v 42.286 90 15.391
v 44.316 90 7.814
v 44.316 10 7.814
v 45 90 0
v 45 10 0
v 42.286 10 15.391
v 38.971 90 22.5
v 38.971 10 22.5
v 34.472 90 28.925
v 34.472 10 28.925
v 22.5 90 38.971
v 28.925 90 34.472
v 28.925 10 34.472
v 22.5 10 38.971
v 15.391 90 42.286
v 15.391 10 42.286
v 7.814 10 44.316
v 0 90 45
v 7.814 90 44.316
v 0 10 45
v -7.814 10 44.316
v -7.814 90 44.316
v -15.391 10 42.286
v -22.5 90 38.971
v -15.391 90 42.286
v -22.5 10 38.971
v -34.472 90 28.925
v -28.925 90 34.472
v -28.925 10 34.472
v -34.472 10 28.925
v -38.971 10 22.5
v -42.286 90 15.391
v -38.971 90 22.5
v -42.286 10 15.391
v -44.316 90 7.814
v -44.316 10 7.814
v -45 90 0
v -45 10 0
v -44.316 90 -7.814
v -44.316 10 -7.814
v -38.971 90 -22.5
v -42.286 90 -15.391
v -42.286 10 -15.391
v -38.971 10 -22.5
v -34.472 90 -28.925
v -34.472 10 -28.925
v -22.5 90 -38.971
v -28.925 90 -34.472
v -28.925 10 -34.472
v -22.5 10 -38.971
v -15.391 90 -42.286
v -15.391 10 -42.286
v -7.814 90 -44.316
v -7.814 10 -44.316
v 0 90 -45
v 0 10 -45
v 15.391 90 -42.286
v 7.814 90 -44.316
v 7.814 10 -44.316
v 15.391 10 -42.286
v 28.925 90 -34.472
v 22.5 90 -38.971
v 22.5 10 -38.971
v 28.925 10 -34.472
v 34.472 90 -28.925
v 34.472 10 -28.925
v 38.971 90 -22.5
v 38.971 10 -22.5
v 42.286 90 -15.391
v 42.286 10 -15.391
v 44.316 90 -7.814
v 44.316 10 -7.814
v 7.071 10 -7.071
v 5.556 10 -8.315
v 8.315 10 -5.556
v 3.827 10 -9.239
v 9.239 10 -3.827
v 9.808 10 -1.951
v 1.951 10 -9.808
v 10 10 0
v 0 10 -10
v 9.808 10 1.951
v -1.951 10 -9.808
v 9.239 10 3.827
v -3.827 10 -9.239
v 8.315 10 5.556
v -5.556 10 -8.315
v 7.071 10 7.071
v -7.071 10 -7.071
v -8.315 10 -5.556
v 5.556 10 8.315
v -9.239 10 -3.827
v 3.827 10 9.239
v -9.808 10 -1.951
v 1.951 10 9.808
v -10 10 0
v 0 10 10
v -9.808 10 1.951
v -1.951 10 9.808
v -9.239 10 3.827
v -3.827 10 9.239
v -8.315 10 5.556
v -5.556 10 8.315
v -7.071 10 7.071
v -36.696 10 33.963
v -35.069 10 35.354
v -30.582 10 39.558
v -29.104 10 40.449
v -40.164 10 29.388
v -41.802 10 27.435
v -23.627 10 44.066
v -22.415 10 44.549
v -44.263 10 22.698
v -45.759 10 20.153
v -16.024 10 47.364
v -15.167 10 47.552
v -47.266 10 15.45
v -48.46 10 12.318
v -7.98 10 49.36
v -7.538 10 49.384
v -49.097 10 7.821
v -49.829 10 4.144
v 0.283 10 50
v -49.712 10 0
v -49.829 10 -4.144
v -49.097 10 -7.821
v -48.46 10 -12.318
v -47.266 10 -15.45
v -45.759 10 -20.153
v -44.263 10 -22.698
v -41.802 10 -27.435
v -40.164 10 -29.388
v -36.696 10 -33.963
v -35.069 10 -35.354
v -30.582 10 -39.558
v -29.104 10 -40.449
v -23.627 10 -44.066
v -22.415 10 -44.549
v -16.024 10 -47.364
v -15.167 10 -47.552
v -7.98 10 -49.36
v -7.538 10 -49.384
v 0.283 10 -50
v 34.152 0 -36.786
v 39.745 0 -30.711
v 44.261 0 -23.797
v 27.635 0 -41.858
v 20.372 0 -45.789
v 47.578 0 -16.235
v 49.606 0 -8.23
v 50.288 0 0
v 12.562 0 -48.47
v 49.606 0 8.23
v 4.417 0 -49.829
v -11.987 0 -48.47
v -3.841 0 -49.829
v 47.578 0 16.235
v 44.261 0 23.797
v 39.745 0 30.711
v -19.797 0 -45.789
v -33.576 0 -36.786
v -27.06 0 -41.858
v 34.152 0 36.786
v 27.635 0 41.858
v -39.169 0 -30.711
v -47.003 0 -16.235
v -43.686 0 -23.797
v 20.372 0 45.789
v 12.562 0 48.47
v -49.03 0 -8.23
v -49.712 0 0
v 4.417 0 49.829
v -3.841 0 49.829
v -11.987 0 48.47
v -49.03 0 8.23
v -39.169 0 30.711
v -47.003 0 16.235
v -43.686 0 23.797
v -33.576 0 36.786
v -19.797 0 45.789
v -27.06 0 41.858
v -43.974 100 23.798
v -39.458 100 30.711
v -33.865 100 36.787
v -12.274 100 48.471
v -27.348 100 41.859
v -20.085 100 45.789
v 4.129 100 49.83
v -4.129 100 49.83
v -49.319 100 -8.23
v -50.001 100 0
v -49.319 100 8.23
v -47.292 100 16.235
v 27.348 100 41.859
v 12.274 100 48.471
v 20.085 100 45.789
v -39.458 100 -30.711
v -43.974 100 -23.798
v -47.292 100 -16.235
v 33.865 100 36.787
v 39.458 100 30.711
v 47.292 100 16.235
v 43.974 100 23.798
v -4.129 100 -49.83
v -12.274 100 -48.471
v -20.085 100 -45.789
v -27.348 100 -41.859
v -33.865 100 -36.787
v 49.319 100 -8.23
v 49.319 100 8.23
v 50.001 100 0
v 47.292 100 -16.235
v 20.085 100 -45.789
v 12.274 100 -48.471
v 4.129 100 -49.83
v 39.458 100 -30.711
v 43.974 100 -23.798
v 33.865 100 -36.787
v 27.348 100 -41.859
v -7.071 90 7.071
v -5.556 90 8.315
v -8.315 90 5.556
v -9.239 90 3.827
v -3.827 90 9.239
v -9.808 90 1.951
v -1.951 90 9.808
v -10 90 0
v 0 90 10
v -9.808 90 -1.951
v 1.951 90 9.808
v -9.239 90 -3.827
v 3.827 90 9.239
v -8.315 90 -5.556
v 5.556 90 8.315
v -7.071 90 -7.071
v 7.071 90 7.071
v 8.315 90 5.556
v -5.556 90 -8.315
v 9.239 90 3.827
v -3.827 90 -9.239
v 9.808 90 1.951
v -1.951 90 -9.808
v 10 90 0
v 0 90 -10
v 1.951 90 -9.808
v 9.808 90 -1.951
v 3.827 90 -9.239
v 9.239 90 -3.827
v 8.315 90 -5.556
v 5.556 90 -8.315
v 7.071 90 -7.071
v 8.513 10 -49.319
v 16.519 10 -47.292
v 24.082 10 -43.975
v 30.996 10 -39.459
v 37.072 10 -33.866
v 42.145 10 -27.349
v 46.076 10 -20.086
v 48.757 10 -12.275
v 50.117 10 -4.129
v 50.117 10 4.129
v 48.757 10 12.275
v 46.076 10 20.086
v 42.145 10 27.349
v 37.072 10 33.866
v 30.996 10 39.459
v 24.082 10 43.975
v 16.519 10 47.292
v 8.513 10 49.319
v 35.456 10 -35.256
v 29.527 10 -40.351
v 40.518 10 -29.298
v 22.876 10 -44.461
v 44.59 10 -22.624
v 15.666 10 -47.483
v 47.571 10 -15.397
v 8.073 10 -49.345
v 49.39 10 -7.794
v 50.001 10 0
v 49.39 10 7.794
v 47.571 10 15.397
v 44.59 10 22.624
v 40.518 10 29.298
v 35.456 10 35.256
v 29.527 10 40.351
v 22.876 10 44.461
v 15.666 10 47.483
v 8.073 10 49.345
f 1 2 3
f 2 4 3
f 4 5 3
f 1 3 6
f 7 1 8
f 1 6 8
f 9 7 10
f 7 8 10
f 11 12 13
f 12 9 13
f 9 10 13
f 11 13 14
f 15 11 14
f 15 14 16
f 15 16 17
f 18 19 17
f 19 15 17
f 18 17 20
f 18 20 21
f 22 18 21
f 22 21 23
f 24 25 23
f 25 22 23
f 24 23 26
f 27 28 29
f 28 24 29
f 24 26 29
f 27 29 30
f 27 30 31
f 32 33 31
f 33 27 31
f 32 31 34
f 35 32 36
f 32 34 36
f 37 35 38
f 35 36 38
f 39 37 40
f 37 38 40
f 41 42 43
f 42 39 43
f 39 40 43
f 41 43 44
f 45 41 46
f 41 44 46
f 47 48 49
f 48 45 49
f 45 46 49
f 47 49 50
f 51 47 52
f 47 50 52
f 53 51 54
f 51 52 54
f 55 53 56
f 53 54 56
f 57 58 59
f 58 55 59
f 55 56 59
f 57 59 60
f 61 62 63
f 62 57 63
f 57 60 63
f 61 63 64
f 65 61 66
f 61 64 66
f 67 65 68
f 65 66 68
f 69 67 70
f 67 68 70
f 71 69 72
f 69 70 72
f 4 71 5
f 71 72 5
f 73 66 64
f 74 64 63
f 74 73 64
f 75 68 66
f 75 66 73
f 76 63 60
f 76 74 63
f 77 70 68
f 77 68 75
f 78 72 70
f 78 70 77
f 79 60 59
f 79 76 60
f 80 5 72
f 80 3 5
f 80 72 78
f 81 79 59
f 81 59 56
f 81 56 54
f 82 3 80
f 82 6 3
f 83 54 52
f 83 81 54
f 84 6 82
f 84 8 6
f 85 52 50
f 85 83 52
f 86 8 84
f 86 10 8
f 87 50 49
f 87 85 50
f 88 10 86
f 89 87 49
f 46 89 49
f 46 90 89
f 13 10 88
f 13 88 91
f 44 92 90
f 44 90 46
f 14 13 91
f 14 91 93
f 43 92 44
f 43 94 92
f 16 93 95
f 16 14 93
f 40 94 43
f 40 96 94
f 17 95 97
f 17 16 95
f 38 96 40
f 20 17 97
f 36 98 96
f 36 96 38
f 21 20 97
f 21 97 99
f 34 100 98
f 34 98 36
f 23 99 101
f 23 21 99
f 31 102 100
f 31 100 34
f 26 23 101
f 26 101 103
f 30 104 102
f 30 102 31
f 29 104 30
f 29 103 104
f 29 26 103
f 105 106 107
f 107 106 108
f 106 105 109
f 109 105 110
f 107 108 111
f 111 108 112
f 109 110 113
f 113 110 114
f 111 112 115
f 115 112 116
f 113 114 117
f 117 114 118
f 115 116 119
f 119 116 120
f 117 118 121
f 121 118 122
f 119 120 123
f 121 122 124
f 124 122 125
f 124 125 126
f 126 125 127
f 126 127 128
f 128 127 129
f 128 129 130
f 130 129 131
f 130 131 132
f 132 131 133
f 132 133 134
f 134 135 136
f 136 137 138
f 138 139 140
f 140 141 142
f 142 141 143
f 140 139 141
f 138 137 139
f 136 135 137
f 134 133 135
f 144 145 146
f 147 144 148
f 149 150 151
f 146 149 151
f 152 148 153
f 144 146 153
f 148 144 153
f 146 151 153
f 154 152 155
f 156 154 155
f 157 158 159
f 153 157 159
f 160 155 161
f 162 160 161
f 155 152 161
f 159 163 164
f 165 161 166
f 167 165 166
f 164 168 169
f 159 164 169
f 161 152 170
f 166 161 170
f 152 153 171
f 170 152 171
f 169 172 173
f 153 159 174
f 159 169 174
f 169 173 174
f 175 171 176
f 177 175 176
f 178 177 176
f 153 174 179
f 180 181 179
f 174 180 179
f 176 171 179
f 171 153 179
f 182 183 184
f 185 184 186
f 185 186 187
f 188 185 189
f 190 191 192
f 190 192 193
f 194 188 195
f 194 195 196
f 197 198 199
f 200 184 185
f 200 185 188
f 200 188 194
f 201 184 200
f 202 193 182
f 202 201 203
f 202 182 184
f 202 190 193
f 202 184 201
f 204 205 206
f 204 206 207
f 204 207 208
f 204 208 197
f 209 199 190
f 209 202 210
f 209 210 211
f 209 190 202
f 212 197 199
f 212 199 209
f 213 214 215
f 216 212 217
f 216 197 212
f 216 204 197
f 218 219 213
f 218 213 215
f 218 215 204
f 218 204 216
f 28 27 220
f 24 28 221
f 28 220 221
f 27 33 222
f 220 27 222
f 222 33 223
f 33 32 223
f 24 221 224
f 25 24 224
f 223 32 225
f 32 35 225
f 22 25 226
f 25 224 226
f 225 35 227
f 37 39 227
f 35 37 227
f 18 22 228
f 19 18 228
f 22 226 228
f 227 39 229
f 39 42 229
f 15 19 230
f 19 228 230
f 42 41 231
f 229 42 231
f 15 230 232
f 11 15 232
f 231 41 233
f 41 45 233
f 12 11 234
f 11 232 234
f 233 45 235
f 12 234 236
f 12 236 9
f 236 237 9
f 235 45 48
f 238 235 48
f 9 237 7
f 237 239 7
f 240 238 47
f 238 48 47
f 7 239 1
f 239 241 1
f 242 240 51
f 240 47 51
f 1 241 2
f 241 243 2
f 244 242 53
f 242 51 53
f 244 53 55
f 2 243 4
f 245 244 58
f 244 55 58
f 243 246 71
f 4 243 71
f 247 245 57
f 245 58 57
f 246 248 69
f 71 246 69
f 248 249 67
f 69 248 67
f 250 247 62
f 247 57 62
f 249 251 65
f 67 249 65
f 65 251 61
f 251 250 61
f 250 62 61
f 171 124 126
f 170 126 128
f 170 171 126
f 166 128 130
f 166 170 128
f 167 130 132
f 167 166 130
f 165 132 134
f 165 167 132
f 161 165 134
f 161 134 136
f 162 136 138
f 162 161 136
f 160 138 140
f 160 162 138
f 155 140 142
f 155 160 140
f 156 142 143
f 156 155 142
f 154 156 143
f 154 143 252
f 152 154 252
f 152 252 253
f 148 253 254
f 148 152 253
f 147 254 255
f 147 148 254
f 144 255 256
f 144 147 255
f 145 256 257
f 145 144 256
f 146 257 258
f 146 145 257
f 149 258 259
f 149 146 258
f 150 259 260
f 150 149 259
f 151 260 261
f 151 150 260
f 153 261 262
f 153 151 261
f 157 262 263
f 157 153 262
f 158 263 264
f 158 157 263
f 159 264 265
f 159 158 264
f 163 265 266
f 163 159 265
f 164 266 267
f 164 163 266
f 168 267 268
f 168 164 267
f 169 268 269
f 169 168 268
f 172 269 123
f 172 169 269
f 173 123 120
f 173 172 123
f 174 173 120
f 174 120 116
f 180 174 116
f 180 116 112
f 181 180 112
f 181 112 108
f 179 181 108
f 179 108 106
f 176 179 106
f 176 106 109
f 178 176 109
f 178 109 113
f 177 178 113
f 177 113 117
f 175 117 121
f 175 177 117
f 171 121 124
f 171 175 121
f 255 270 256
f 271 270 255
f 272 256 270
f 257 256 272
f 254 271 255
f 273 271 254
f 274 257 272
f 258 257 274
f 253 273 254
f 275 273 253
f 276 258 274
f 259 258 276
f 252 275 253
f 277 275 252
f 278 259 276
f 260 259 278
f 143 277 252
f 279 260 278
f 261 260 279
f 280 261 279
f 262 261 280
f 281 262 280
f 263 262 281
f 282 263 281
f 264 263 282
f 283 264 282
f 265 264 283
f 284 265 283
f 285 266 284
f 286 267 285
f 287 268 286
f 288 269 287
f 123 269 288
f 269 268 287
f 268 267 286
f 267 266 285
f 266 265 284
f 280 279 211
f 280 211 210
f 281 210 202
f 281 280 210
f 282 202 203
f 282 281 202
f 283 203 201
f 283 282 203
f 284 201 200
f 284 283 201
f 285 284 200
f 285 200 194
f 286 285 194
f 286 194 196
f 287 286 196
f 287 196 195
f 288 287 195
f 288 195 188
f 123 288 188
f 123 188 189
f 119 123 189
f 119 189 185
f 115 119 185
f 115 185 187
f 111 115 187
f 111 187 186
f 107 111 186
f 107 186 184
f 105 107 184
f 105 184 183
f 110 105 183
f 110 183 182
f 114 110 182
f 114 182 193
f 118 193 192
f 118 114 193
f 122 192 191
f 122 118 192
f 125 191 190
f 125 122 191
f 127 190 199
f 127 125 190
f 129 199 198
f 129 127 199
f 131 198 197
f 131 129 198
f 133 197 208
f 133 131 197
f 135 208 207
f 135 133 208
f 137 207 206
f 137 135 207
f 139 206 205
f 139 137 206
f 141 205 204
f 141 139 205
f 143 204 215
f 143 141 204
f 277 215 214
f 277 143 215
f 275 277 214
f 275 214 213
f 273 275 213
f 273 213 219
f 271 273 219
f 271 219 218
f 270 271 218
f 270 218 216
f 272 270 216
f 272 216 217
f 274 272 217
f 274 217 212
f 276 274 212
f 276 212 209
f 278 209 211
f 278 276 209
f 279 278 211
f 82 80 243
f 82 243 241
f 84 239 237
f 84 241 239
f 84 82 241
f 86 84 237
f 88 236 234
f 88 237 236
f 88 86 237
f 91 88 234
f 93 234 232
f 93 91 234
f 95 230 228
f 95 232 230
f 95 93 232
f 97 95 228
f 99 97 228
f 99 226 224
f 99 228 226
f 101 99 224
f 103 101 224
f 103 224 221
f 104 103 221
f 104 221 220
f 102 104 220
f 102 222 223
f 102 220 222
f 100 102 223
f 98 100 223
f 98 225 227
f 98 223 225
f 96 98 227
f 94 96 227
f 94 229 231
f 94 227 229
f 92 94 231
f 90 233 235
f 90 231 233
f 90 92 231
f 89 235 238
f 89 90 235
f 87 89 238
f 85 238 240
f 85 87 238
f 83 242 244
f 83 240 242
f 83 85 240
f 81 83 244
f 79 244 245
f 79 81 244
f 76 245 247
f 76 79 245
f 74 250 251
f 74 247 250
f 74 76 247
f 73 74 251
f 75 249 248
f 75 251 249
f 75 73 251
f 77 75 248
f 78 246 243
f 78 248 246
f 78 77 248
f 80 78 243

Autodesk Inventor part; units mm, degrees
ref_plane "YZ Plane" through (0, 0, 0) normal (1, 0, 0) x (0, 1, 0)
ref_plane "XZ Plane" through (0, 0, 0) normal (0, 1, 0) x (-1, 0, 0)
ref_plane "XY Plane" through (0, 0, 0) normal (0, 0, 1) x (1, 0, 0)
sketch "Sketch2" plane through (0, 0, 0) normal (0, 1, 0) x (-1, 0, 0)
  point P0 (0, 0)
sketch "Sketch3" plane through (0, 0, 0) normal (0, 1, 0) x (-1, 0, 0)
  circle A0 centre (-0.2876, 0) radius 50
  point P0 (0, 0)
  dimension "d0" = 100
extrude "Extrusion1" add sketch "Sketch3" along normal blind 10
sketch "Sketch4" plane through (0.2876, 10, 0) normal (0, 1, 0) x (1, 0, 0)
  circle A0 centre (-0.2876, 0) radius 50.0008
  circle A1 centre (-0.2876, 0) radius 45
  circle A2 centre (-0.2876, 0) radius 10
  dimension "d3" = 90
  dimension "d4" = 20
extrude "Extrusion2" add sketch "Sketch4" along normal blind 80
sketch "Sketch5" plane through (0, 90, 0) normal (0, 1, 0) x (1, 0, 0)
  circle A0 centre (0, 0) radius 50.0008
extrude "Extrusion3" add sketch "Sketch5" along normal blind 10
properties part number "cyl1_10cm_10cm"
